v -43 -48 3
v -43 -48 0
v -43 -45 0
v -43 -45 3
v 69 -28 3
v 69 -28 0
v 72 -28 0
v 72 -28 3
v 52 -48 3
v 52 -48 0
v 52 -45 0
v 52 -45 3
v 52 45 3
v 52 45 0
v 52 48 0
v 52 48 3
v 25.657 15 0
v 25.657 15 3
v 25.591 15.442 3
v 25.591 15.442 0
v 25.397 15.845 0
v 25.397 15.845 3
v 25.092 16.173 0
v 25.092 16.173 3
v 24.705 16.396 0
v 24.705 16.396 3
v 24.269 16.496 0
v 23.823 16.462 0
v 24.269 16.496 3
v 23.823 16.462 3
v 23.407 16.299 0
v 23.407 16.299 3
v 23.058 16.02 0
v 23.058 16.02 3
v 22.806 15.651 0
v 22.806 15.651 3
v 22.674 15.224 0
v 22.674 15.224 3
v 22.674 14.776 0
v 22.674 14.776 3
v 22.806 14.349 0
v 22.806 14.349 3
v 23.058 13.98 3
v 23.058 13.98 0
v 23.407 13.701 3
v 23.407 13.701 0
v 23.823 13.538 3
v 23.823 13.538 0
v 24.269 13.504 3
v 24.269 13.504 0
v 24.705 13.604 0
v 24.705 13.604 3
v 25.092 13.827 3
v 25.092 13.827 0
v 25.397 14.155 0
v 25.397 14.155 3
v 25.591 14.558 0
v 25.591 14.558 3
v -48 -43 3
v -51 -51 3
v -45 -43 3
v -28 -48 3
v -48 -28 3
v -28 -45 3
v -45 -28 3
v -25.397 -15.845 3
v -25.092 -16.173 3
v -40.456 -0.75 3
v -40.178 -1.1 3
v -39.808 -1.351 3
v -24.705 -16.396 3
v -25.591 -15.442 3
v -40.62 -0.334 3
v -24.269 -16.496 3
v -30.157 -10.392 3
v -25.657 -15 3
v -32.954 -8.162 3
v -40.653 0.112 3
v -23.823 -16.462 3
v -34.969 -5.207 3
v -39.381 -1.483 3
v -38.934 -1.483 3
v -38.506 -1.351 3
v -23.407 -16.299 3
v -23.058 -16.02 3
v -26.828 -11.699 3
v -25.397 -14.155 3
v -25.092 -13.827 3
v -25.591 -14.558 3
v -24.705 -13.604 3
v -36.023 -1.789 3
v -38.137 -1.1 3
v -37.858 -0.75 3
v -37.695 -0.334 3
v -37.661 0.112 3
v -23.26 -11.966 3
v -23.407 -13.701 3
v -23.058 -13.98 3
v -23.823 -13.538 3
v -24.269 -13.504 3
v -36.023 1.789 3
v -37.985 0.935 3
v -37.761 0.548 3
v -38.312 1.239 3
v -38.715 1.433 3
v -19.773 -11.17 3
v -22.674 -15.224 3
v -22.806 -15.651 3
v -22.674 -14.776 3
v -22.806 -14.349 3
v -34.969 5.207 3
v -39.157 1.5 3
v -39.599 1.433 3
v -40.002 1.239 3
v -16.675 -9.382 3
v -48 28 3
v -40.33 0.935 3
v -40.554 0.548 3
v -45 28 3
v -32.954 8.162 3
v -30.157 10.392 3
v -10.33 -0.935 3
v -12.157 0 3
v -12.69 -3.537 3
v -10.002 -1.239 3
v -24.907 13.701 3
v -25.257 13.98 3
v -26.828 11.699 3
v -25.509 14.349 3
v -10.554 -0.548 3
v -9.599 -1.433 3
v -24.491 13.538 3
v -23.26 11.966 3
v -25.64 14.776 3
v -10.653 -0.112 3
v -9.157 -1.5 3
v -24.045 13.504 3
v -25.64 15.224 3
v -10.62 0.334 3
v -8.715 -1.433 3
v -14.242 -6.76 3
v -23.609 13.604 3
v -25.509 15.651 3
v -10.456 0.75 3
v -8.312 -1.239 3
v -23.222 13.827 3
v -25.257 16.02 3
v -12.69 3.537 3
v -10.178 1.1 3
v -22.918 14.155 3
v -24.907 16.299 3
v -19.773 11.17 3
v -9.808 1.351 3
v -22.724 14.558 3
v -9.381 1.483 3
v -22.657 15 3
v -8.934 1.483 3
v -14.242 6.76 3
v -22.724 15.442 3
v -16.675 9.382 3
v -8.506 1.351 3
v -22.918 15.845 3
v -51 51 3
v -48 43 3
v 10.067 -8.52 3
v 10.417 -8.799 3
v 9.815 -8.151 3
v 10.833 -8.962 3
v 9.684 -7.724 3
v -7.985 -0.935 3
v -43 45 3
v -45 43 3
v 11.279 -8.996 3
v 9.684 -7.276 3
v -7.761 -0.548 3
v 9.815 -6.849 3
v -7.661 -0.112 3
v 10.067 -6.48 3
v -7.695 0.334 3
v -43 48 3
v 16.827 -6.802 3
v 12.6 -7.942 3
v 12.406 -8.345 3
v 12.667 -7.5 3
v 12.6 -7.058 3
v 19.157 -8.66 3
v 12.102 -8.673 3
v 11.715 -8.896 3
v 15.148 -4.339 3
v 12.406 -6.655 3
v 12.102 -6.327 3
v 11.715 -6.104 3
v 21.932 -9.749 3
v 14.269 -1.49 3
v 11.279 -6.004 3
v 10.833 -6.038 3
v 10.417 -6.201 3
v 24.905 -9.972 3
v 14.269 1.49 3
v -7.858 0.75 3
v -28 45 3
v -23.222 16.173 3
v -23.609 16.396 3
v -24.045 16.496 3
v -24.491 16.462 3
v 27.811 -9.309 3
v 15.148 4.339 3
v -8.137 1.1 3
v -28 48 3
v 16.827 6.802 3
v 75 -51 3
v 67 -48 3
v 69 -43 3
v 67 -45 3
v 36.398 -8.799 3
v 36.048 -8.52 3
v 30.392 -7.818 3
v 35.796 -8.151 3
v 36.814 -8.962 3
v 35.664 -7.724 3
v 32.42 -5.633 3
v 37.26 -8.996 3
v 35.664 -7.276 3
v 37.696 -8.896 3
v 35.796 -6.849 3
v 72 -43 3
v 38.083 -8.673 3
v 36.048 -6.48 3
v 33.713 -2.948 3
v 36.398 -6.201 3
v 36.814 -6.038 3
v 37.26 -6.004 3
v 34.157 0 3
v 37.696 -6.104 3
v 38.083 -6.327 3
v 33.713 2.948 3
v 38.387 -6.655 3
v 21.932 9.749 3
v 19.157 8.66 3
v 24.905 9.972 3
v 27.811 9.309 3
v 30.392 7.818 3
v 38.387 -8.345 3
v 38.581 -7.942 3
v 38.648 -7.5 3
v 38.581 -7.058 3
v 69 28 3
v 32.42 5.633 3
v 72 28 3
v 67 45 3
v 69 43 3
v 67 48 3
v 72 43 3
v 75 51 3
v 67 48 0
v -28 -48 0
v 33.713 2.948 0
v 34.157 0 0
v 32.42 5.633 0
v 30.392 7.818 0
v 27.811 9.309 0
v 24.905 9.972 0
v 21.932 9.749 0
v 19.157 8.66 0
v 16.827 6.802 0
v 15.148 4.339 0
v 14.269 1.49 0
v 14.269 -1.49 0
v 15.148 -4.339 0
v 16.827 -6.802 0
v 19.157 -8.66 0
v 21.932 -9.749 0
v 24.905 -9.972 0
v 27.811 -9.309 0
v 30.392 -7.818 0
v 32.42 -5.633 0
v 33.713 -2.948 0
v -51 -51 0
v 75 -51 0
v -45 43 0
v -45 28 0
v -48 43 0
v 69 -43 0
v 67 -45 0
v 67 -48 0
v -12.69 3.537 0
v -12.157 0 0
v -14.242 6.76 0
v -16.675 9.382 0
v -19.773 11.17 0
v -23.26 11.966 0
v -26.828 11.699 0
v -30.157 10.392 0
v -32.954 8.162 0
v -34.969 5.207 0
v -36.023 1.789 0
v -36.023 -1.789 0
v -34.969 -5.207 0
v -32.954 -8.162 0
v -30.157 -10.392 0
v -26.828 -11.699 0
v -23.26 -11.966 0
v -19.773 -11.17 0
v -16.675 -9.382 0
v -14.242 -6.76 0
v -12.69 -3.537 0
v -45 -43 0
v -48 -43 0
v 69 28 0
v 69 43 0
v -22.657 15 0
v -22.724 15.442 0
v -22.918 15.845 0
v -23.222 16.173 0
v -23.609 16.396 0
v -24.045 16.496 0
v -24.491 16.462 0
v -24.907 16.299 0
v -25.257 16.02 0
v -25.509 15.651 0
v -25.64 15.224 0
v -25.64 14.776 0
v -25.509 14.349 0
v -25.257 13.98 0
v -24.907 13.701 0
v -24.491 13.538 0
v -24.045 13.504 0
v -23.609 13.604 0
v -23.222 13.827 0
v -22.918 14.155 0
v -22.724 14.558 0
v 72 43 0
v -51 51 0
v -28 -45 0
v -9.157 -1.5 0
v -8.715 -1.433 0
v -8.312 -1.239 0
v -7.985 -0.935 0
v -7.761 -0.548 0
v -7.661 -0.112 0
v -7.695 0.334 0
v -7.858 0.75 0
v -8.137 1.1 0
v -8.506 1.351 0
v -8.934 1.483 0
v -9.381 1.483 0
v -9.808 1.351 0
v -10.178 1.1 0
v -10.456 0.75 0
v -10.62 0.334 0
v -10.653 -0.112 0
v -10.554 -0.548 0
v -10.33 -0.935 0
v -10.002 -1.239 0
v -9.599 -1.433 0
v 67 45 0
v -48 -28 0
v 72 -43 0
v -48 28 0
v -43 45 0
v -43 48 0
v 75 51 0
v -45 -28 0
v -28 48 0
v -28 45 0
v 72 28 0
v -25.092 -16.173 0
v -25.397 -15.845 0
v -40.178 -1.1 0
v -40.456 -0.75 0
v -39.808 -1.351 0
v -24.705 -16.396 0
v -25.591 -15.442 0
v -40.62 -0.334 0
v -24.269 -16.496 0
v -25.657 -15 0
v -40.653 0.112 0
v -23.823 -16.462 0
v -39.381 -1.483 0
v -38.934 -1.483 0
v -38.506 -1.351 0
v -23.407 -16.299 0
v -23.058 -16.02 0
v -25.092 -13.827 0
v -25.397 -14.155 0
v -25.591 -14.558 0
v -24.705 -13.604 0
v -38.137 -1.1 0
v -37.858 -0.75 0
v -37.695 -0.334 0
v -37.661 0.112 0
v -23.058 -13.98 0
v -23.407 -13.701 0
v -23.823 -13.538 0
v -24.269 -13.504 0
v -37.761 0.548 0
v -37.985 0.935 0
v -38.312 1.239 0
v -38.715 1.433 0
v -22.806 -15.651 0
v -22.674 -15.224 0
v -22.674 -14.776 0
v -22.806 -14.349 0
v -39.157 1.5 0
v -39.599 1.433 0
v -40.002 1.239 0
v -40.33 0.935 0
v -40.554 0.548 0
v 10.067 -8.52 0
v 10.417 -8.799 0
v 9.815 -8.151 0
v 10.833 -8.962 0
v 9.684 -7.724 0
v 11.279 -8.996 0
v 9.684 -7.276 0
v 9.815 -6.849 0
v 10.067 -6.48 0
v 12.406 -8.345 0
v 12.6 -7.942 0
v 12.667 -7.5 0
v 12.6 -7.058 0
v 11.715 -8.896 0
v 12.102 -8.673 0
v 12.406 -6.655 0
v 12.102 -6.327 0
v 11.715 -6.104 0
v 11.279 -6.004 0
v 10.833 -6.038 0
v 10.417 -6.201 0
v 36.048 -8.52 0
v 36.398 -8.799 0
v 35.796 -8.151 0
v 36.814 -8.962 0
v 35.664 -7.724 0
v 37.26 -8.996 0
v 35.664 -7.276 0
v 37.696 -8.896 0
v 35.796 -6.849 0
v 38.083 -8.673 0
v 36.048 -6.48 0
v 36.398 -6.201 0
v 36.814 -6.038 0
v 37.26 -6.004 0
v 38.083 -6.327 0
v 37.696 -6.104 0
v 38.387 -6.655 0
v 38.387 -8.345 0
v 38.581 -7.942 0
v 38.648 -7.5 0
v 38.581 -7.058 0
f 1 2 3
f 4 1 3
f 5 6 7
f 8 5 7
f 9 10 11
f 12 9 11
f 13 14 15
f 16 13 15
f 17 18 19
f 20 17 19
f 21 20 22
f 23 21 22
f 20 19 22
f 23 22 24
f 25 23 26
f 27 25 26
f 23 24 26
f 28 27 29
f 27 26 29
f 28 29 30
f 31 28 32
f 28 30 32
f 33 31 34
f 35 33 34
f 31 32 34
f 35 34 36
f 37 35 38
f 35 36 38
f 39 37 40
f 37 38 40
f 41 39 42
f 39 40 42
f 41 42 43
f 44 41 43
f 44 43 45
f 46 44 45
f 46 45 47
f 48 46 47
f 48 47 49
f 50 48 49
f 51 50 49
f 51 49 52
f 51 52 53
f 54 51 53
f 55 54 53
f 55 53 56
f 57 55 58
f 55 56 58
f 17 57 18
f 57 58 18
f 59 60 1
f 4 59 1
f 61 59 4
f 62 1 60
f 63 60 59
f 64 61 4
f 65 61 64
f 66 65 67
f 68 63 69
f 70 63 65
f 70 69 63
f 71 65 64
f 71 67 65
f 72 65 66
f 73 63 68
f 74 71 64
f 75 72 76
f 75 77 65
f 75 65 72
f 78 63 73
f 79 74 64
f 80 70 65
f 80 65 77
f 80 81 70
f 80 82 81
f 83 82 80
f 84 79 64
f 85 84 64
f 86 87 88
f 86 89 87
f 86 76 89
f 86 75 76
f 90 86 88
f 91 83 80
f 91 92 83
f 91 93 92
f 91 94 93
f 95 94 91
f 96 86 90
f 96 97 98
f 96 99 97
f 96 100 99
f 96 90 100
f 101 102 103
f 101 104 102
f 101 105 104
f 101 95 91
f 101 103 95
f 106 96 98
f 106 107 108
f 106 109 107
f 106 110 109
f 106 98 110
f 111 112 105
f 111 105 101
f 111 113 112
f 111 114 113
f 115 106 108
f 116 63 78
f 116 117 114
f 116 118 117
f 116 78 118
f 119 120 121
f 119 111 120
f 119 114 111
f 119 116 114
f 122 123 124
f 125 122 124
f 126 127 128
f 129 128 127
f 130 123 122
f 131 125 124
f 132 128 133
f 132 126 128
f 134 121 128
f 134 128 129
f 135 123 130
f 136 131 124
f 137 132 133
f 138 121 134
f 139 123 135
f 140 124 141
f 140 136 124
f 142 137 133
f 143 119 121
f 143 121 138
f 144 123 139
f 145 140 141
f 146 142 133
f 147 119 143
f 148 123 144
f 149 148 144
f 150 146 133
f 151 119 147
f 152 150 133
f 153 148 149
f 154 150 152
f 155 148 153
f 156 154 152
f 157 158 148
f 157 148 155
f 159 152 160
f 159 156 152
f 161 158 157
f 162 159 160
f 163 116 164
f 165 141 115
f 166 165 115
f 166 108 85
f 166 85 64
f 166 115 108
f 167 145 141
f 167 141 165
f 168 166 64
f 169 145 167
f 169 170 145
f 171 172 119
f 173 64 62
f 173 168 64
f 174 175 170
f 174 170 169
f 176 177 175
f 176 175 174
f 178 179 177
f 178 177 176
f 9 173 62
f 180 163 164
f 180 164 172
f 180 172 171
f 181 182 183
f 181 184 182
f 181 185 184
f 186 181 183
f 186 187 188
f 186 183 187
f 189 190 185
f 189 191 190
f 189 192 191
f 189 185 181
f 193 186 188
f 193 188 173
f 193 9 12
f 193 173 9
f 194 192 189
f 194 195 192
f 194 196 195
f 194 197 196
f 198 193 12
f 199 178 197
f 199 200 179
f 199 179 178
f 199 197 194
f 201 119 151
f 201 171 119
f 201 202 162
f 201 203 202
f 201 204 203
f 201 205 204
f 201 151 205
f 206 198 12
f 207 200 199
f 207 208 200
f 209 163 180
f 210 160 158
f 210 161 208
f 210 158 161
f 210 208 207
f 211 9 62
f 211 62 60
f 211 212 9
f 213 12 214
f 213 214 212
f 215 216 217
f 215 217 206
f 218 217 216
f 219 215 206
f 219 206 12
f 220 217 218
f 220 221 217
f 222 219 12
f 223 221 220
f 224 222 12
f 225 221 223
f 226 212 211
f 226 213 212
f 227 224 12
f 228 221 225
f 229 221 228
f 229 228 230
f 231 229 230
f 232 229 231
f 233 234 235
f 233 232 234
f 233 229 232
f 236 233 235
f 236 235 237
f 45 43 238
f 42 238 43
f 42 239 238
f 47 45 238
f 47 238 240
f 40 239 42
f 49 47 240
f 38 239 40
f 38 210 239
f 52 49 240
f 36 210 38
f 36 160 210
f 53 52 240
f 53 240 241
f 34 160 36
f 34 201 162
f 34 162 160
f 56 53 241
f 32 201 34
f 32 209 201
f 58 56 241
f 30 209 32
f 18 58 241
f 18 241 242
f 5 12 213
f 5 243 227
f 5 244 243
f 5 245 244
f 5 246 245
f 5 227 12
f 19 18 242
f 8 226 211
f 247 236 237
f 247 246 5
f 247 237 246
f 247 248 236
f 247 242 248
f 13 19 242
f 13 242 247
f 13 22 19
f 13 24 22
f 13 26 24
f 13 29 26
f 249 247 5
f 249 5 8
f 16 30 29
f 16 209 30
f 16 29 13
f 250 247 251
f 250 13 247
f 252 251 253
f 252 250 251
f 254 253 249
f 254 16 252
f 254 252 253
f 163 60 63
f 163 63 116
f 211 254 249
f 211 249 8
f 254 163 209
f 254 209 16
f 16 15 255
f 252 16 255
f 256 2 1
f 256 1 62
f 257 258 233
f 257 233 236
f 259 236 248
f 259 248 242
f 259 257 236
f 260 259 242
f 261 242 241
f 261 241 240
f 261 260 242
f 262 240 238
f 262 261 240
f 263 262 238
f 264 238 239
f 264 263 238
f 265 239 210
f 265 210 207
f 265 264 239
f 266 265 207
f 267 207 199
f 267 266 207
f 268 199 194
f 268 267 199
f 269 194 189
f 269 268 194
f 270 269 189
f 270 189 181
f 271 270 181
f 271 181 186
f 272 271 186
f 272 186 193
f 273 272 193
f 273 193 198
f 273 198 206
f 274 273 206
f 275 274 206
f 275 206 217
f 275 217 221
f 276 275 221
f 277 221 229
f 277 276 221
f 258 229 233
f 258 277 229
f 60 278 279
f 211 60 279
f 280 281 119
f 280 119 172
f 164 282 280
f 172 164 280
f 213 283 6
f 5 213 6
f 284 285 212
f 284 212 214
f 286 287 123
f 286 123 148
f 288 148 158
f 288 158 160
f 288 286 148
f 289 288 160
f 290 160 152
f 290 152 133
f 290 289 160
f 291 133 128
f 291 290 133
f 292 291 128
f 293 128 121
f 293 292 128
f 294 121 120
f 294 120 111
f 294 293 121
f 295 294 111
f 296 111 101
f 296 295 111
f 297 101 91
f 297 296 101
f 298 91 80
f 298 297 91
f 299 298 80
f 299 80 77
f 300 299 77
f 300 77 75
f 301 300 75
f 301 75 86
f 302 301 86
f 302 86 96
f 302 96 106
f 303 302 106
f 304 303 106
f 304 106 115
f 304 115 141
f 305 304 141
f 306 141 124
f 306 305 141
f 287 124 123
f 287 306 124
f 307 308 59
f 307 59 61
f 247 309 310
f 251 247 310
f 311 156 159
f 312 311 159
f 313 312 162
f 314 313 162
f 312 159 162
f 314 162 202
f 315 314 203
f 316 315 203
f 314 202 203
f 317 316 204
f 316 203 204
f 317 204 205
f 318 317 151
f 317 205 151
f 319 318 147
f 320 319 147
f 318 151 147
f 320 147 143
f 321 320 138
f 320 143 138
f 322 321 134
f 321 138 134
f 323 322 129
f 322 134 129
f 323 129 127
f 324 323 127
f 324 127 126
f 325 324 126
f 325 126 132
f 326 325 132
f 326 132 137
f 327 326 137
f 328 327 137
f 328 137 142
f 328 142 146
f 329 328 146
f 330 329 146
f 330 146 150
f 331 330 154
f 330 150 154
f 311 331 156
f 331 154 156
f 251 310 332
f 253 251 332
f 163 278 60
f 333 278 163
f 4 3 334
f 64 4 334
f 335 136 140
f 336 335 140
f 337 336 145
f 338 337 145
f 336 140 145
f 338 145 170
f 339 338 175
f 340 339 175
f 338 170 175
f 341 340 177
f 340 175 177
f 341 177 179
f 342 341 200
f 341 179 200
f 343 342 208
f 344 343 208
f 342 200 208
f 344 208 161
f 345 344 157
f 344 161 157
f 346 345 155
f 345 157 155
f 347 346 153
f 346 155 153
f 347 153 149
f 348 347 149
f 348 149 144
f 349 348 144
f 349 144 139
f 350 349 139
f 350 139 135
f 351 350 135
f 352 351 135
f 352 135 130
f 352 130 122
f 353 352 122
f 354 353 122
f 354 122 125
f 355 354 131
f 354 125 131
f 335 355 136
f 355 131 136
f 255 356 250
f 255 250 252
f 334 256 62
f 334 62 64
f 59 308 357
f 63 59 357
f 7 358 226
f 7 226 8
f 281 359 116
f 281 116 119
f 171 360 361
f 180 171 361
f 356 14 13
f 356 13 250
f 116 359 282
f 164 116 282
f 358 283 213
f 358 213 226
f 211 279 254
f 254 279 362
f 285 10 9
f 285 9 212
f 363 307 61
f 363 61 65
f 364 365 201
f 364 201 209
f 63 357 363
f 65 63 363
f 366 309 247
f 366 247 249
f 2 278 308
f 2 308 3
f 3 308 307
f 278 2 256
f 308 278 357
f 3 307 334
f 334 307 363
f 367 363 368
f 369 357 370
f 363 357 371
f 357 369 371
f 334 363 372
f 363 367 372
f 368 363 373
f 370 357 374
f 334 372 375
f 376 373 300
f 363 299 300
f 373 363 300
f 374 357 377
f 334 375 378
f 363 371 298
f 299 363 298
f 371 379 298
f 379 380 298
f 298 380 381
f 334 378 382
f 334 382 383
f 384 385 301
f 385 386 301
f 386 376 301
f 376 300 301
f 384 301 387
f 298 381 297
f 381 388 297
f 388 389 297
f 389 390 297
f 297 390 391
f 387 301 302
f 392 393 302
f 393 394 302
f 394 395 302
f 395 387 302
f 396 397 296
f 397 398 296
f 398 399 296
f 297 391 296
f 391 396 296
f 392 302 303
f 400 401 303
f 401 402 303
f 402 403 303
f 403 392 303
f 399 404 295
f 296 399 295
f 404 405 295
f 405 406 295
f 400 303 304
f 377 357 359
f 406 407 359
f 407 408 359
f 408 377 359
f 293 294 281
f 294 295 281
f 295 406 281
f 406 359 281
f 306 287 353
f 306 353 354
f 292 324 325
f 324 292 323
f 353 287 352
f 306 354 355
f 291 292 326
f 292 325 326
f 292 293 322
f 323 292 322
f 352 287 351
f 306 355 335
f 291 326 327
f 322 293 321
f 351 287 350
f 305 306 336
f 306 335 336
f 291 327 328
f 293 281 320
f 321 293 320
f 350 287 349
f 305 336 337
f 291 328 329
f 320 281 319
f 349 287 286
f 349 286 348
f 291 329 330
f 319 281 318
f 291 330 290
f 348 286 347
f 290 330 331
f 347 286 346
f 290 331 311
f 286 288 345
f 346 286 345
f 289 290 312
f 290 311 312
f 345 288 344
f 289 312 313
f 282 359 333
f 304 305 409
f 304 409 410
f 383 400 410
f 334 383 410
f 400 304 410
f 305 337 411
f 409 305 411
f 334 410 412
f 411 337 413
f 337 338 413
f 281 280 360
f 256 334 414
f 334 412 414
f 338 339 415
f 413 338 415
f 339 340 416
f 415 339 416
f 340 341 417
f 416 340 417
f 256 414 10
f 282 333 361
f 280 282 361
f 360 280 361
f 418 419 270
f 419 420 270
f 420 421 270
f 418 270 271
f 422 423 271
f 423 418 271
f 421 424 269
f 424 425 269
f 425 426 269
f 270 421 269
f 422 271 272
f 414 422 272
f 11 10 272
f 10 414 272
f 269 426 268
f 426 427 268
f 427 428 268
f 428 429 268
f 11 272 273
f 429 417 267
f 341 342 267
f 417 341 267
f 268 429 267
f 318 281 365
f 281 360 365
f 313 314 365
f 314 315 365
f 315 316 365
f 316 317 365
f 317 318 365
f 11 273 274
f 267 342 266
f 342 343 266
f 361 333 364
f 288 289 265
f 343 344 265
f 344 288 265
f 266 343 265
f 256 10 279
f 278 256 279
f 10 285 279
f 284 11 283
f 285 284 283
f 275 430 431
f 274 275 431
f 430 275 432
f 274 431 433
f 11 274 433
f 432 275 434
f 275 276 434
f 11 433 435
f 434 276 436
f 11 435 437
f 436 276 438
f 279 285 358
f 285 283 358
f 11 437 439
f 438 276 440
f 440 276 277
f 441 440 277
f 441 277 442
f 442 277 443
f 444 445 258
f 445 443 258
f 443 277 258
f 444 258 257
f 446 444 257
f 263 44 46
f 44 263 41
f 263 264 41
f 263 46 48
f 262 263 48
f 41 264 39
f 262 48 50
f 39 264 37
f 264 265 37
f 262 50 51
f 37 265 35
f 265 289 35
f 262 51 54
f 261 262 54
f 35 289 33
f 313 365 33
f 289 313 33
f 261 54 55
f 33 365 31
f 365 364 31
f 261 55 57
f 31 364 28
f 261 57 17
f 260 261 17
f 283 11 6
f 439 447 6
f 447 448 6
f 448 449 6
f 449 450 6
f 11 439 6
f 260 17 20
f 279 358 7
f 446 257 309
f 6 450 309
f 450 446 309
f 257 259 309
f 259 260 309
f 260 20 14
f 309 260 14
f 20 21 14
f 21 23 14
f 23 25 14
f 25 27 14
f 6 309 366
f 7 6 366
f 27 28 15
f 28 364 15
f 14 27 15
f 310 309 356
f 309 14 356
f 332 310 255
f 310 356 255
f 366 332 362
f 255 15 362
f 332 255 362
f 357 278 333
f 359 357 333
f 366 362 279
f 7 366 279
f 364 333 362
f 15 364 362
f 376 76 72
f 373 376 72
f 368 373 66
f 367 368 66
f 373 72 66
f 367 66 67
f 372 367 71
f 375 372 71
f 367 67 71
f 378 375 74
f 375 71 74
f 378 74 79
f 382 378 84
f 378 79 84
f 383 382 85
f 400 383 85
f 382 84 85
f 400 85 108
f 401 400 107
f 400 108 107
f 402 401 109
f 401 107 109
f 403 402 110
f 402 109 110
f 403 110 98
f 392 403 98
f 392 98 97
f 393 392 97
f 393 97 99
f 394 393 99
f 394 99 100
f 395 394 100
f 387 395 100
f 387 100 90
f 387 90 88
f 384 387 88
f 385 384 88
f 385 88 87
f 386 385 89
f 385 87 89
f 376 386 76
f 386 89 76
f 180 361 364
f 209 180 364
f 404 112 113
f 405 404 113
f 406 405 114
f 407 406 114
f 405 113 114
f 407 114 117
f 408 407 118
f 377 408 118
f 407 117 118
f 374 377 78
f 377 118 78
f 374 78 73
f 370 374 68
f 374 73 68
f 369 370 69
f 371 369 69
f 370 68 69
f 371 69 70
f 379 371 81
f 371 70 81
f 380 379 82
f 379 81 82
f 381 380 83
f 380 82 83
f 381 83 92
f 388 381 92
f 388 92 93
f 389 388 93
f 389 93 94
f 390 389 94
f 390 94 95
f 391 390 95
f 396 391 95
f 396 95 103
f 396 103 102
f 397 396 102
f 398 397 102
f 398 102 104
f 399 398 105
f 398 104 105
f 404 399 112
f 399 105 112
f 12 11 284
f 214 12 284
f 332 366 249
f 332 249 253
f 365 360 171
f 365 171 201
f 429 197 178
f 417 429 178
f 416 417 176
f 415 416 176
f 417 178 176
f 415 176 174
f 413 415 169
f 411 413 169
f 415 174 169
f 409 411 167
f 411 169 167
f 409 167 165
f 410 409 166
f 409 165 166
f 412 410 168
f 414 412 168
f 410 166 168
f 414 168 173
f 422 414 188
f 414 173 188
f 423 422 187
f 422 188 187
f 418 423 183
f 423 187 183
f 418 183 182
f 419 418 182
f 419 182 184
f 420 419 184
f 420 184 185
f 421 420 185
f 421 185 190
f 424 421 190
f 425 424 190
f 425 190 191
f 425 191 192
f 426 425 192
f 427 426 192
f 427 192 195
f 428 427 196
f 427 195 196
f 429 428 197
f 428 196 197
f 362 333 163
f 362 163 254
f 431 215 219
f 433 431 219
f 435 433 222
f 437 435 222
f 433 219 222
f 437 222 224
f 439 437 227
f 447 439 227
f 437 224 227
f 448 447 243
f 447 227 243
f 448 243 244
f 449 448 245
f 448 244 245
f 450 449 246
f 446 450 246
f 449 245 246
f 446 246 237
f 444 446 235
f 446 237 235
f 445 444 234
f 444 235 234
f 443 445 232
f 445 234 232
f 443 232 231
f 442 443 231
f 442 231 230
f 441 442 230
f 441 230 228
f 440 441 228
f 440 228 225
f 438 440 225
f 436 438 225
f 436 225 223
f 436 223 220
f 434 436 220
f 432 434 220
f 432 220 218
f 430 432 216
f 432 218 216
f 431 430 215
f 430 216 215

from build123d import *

# Parameters (mm, degrees)
SKETCH1_W           = 126
SKETCH1_H           = 102
SKETCH1_R           = 12
SKETCH1_R_2         = 10
SKETCH1_W_2         = 3
SKETCH1_H_2         = 15
SKETCH1_W_3         = 15
SKETCH1_H_3         = 3
BOSS_EXTRUDE1_DEPTH = 3
SKETCH2_R           = 1.5
CUT_EXTRUDE1_DEPTH  = 3
CIRPATTERN1_COUNT   = 3
SKETCH3_R           = 1.5
CUT_EXTRUDE2_DEPTH  = 3
CIRPATTERN2_COUNT   = 4


with BuildPart() as part:
    # Sketch1 → Boss-Extrude1 (new body)
    with BuildSketch(Plane.XY):
        with Locations((12, 0)):
            Rectangle(SKETCH1_W, SKETCH1_H)
        with Locations((-24.15725, 0)):
            Circle(SKETCH1_R, mode=Mode.SUBTRACT)
        with Locations((24.15725, 0)):
            Circle(SKETCH1_R_2, mode=Mode.SUBTRACT)
        with Locations((-46.5, -35.5)):
            Rectangle(SKETCH1_W_2, SKETCH1_H_2, mode=Mode.SUBTRACT)
        with Locations((-46.5, 35.5)):
            Rectangle(SKETCH1_W_2, SKETCH1_H_2, mode=Mode.SUBTRACT)
        with Locations((70.5, -35.5)):
            Rectangle(SKETCH1_W_2, SKETCH1_H_2, mode=Mode.SUBTRACT)
        with Locations((70.5, 35.5)):
            Rectangle(SKETCH1_W_2, SKETCH1_H_2, mode=Mode.SUBTRACT)
        with Locations((-35.5, 46.5)):
            Rectangle(SKETCH1_W_3, SKETCH1_H_3, mode=Mode.SUBTRACT)
        with Locations((59.5, 46.5)):
            Rectangle(SKETCH1_W_3, SKETCH1_H_3, mode=Mode.SUBTRACT)
        with Locations((-35.5, -46.5)):
            Rectangle(SKETCH1_W_3, SKETCH1_H_3, mode=Mode.SUBTRACT)
        with Locations((59.5, -46.5)):
            Rectangle(SKETCH1_W_3, SKETCH1_H_3, mode=Mode.SUBTRACT)
    extrude(amount=BOSS_EXTRUDE1_DEPTH)

    # Sketch2 → Cut-Extrude1 (cut)
    with BuildSketch(Plane.XY.offset(3)):
        with Locations((24.15725, 15)):
            Circle(SKETCH2_R)
    cut_extrude1 = extrude(amount=-CUT_EXTRUDE1_DEPTH, mode=Mode.SUBTRACT)

    # CirPattern1: Cut-Extrude1 ×3 about axis
    cirpattern1_axis = Axis((24.15725, 0, 0), (0, 0, 1))
    for i in range(1, CIRPATTERN1_COUNT):
        add(cut_extrude1.rotate(cirpattern1_axis, i * 360 / CIRPATTERN1_COUNT), mode=Mode.SUBTRACT)

    # Sketch3 → Cut-Extrude2 (cut)
    with BuildSketch(Plane.XY.offset(3)):
        with Locations((-24.15725, 15)):
            Circle(SKETCH3_R)
    cut_extrude2 = extrude(amount=-CUT_EXTRUDE2_DEPTH, mode=Mode.SUBTRACT)

    # CirPattern2: Cut-Extrude2 ×4 about axis
    cirpattern2_axis = Axis((-24.15725, 0, 0), (0, 0, 1))
    for i in range(1, CIRPATTERN2_COUNT):
        add(cut_extrude2.rotate(cirpattern2_axis, i * 360 / CIRPATTERN2_COUNT), mode=Mode.SUBTRACT)


solid = part.part
